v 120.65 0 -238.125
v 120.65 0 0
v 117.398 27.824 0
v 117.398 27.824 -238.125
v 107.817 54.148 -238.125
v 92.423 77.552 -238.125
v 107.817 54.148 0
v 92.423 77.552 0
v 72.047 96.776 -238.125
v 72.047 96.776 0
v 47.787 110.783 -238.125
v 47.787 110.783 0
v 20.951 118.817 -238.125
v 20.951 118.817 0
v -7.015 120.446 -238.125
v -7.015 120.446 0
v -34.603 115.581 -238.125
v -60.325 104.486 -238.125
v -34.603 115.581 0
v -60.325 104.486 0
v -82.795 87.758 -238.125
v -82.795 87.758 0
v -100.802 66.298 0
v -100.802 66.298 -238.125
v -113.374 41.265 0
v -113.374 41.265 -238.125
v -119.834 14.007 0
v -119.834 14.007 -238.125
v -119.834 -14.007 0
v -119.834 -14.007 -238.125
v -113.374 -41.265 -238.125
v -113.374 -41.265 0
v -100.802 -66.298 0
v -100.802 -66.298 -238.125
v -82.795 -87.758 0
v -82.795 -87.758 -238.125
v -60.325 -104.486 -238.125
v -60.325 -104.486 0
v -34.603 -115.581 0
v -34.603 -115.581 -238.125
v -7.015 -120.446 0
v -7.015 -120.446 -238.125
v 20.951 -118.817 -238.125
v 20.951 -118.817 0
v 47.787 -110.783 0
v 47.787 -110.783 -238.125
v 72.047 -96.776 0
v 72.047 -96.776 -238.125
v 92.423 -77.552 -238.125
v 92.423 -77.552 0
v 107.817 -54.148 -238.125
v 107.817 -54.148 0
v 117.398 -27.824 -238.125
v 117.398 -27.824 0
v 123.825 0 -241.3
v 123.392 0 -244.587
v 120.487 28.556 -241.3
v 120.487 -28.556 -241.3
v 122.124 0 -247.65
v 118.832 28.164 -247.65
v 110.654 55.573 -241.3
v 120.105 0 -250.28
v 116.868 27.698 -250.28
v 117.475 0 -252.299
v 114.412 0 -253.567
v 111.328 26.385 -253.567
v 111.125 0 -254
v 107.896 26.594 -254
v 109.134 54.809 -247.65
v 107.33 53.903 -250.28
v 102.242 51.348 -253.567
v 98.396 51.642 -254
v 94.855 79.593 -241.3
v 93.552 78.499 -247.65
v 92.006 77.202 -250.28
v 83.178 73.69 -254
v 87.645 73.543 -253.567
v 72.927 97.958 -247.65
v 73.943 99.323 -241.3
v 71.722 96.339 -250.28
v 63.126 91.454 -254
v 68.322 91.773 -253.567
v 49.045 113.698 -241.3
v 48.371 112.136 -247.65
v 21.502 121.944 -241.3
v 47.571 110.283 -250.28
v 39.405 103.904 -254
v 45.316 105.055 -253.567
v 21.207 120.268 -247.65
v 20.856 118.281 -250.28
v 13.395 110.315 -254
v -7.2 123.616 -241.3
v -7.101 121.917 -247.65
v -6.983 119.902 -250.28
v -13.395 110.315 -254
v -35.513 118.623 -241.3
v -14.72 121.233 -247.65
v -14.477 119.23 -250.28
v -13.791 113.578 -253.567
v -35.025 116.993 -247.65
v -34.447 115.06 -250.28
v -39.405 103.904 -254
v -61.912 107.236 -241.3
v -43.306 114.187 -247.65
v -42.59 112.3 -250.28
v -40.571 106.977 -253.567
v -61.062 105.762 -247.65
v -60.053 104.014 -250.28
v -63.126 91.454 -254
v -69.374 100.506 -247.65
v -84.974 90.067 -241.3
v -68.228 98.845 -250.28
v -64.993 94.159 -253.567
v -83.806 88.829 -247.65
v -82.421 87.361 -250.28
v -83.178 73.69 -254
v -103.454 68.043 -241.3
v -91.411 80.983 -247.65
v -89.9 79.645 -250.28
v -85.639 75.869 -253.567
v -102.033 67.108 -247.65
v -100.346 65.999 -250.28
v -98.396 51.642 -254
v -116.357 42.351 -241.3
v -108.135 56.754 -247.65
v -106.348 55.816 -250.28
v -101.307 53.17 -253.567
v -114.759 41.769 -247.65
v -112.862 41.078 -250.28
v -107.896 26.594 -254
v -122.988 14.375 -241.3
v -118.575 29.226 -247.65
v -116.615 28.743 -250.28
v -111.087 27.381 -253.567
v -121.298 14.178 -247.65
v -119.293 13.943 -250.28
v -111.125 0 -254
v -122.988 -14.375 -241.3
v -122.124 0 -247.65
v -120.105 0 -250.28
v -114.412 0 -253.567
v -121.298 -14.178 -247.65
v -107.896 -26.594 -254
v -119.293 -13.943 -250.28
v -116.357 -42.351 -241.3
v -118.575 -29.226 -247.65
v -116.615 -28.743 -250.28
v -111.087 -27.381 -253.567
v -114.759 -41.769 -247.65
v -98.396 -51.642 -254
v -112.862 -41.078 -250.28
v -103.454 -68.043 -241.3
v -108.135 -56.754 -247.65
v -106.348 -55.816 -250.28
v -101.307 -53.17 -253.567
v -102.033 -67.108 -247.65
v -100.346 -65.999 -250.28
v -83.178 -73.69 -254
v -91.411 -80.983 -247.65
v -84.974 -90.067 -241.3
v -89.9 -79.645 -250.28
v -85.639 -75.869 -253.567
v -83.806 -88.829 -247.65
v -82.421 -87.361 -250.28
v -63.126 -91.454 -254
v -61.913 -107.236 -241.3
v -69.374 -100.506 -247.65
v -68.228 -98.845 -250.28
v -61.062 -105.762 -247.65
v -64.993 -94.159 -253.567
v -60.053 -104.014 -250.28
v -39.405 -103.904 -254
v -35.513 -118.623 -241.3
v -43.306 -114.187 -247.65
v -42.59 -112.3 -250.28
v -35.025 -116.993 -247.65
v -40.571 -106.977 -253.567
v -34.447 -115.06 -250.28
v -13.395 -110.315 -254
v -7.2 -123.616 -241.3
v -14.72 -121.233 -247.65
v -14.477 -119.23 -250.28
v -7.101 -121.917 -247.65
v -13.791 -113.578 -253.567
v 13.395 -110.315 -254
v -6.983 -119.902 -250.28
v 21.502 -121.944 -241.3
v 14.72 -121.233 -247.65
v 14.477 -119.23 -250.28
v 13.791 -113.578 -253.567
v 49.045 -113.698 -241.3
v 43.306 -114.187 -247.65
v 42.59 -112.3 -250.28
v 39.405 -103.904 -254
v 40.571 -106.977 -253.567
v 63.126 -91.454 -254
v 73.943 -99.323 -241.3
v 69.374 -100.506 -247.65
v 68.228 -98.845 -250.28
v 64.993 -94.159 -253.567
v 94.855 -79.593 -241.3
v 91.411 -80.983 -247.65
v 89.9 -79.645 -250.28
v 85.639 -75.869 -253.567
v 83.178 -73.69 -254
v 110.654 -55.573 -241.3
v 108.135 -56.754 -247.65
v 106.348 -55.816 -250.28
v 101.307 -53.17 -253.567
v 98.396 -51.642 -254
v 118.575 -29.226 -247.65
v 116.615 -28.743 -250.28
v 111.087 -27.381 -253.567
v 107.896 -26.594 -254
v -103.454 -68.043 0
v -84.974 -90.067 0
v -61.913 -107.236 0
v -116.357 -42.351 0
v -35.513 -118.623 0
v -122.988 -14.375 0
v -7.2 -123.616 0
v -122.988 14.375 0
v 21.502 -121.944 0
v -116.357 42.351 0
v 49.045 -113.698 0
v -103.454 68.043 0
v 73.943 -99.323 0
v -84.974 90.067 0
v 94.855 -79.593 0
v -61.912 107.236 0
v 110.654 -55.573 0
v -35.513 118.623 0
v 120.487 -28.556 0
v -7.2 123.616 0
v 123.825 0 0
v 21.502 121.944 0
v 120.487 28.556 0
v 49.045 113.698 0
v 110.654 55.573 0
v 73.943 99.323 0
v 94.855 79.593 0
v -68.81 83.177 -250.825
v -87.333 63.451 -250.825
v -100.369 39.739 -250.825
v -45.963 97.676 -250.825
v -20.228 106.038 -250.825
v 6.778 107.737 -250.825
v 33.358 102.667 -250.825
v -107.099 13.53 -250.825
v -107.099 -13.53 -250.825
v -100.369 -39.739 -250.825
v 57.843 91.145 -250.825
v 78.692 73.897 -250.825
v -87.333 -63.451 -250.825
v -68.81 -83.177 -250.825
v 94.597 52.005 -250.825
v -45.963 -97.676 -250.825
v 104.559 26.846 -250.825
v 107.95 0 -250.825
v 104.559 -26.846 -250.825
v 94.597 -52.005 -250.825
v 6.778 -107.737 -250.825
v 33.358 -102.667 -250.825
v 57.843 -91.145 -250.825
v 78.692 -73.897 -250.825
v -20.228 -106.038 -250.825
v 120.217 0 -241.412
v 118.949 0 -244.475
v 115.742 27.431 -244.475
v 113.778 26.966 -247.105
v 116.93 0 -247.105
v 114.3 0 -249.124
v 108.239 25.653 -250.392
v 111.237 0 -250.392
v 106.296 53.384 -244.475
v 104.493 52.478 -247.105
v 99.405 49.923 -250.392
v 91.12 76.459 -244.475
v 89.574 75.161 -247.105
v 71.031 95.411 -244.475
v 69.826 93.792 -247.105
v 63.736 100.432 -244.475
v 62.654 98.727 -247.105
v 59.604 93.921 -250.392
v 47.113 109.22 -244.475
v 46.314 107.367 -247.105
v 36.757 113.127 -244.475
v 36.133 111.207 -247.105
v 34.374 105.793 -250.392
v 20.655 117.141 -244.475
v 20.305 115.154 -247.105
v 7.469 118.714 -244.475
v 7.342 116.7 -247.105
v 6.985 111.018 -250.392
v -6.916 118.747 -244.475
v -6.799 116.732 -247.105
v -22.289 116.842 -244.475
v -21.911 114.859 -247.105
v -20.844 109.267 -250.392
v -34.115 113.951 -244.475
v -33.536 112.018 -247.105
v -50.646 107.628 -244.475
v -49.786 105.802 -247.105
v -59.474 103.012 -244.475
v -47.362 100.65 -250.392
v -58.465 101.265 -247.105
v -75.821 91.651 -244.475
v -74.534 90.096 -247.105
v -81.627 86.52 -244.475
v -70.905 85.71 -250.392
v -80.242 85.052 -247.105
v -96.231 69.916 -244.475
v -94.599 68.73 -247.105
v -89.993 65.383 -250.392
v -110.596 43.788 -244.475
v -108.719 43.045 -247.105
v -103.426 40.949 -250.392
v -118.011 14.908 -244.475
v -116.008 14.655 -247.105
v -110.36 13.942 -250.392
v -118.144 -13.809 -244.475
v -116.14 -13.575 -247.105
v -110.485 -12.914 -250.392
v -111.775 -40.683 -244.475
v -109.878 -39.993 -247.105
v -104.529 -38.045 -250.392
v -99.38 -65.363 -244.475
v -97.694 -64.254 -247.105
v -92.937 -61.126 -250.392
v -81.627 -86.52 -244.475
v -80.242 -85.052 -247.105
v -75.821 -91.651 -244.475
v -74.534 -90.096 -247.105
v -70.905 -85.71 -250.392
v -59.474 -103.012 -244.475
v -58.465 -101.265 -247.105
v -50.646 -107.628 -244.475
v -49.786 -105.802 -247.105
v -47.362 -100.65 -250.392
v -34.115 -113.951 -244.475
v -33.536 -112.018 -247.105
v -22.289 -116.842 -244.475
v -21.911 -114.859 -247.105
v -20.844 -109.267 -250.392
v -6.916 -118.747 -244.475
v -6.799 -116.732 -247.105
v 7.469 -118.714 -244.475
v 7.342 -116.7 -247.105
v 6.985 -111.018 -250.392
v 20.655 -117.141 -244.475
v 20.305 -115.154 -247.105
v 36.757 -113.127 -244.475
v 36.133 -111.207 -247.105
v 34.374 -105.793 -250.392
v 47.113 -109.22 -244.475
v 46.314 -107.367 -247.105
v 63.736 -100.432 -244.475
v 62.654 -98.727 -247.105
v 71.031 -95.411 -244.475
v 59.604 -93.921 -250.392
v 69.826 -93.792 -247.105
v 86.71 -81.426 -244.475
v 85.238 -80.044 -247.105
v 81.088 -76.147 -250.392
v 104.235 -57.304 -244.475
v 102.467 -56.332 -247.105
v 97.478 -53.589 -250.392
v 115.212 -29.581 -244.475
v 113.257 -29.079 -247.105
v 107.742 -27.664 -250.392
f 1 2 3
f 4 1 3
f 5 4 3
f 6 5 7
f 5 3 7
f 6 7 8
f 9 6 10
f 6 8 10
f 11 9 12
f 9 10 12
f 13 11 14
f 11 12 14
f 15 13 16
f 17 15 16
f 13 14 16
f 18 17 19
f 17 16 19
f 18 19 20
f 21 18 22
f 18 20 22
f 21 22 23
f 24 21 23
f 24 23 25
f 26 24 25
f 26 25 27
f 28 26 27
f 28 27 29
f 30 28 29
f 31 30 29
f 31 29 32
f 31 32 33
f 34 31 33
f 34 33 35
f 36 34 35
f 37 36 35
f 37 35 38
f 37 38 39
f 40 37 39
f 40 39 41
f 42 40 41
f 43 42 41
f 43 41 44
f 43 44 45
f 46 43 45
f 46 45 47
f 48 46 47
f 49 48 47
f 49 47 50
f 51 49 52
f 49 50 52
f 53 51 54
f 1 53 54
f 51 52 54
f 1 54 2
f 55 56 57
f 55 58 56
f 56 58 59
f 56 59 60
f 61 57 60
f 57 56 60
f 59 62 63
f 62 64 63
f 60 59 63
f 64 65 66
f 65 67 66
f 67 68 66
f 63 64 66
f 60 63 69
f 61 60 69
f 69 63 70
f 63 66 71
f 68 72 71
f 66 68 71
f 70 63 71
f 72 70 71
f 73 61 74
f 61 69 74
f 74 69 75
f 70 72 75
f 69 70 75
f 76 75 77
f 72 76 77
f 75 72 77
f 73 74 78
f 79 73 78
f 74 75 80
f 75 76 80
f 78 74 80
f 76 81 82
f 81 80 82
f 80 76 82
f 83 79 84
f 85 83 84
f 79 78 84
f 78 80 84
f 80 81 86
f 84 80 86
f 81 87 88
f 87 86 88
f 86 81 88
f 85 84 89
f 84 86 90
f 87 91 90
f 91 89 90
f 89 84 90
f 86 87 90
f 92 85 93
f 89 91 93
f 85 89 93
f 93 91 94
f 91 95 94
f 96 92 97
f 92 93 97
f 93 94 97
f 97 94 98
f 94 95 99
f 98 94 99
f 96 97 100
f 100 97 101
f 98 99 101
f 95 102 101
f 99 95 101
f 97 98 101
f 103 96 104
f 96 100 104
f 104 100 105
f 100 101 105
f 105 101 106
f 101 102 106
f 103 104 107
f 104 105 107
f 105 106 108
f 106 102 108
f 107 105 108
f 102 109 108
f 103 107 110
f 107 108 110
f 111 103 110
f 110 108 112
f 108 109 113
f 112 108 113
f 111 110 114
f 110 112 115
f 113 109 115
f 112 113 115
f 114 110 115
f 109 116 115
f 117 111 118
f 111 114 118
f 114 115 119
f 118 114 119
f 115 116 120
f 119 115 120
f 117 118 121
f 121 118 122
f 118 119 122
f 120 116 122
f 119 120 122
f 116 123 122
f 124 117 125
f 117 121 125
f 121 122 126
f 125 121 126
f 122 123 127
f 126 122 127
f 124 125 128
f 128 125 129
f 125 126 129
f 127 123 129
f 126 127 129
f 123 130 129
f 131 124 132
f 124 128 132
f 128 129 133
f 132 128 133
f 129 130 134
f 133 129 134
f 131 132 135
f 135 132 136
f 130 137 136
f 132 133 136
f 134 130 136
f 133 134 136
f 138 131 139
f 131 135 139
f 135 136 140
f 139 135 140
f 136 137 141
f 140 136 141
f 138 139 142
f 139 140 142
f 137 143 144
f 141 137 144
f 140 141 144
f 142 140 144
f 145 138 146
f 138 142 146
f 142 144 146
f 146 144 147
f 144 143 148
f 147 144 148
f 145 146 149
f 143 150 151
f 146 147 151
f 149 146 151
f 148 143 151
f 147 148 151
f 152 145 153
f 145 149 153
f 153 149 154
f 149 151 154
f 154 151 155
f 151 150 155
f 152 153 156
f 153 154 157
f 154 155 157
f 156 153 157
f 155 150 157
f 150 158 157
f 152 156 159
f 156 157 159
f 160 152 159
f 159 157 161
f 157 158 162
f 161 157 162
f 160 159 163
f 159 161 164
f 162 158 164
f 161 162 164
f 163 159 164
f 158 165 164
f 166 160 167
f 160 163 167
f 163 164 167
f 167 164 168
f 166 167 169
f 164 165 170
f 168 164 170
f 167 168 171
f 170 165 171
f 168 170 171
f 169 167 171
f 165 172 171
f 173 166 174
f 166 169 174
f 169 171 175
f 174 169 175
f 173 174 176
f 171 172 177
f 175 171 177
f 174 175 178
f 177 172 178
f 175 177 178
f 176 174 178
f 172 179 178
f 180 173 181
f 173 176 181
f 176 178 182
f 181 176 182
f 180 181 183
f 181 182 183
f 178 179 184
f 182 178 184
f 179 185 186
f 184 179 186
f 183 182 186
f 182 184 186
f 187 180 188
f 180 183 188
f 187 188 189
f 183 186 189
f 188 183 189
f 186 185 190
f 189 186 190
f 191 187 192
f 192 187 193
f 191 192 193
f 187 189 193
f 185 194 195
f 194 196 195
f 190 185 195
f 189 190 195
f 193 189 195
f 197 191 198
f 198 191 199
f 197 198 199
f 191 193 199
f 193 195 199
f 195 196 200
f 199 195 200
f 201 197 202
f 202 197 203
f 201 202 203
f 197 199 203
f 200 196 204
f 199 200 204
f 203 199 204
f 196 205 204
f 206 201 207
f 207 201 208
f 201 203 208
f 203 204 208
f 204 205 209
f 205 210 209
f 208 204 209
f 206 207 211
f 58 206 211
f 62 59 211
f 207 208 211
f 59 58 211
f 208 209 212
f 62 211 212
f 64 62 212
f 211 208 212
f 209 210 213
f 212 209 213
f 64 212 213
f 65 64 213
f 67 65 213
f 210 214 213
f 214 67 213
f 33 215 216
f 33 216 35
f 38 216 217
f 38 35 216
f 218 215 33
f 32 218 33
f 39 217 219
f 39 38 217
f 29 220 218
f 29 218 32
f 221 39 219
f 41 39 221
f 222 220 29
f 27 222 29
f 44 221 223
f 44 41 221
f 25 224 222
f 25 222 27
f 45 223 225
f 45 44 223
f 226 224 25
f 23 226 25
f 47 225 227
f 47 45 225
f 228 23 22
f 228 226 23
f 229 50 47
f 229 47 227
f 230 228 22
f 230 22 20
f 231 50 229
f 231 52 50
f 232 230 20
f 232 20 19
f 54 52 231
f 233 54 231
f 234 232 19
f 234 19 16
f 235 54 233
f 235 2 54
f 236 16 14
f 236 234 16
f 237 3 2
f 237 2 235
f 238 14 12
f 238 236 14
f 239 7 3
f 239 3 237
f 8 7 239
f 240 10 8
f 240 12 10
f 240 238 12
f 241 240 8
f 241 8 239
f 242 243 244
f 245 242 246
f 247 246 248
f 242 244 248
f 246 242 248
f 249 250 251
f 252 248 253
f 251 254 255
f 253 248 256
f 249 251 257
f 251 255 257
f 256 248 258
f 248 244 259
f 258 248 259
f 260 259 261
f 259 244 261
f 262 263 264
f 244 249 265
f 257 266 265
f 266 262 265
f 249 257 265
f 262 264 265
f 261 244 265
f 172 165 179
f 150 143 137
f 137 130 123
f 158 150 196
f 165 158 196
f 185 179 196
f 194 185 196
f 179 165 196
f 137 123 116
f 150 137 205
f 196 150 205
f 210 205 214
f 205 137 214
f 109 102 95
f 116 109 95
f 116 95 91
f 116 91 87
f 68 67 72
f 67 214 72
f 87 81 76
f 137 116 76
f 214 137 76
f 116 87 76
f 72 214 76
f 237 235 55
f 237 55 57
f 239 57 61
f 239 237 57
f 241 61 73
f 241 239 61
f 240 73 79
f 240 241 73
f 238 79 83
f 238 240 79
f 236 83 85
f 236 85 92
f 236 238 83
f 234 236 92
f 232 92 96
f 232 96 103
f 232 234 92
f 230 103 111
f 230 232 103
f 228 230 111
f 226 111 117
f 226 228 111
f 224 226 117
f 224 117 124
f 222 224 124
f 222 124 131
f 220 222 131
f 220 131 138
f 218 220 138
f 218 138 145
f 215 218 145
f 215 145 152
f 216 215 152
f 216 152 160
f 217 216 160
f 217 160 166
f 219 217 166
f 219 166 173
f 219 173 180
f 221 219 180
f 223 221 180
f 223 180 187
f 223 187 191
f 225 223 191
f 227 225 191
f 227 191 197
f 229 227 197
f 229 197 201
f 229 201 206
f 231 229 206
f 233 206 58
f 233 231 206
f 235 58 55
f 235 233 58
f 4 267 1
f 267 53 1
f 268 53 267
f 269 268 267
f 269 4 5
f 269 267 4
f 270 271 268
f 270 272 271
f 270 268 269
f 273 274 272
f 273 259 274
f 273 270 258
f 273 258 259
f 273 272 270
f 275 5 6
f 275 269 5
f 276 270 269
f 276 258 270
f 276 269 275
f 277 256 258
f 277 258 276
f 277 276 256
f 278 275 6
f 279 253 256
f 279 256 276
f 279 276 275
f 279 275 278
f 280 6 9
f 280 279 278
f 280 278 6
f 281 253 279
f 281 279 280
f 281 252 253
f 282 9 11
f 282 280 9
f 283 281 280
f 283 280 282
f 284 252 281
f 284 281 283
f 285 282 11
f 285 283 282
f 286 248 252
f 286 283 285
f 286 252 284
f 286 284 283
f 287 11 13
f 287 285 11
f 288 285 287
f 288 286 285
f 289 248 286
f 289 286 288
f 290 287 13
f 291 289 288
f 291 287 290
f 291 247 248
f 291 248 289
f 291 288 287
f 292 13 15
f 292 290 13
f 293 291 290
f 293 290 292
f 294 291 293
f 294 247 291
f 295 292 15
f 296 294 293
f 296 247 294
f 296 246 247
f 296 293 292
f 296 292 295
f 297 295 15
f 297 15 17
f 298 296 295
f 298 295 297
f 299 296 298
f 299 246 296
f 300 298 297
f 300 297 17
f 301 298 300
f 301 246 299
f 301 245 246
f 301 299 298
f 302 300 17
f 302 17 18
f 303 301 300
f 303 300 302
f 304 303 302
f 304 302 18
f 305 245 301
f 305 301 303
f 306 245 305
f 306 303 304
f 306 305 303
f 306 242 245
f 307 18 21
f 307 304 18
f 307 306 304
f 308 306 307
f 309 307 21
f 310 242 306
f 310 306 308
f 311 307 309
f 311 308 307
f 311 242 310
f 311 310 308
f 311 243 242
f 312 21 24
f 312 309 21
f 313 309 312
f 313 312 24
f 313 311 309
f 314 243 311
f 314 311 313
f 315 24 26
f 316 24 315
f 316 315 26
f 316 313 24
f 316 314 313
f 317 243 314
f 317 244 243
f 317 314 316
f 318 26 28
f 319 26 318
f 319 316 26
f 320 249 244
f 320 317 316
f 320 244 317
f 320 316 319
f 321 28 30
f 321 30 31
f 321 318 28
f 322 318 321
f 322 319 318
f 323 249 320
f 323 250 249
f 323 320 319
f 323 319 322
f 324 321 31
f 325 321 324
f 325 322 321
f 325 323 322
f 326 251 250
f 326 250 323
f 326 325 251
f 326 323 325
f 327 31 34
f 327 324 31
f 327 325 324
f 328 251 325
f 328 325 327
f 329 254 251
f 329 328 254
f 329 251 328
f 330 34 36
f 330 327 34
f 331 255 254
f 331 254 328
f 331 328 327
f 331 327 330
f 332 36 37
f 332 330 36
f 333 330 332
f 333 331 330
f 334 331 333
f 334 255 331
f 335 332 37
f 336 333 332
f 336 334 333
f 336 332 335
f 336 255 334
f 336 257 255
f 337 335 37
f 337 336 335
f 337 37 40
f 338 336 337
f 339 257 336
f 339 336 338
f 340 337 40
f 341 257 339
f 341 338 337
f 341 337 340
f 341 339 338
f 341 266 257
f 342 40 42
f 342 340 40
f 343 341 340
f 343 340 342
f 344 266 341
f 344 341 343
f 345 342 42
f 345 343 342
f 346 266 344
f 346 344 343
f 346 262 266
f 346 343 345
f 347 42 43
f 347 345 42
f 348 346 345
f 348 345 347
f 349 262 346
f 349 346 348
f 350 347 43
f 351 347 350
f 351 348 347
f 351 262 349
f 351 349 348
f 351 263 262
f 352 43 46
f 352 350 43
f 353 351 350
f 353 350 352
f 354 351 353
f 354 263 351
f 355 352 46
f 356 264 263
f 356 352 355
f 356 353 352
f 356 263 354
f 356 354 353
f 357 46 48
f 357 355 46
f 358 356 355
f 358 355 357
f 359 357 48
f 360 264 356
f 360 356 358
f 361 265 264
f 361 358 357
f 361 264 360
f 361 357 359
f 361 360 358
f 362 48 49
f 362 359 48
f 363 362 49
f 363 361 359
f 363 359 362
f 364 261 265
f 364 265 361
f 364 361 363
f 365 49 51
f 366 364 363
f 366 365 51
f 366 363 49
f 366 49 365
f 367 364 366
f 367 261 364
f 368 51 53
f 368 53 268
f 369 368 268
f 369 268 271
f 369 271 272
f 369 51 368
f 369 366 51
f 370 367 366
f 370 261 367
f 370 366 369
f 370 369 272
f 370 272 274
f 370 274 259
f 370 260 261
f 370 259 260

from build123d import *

# Parameters (mm, degrees)
F0_R     = 123.825
F0_R_2   = 120.65
F1_DEPTH = 254
F2_R     = 123.825
F3_DEPTH = 3.175
F4_R     = 12.7


with BuildPart() as f1:
    # F0 (on Top) → F1 (new body)
    with BuildSketch(Plane.XY):
        Circle(F0_R)
        Circle(F0_R_2, mode=Mode.SUBTRACT)
    extrude(amount=-F1_DEPTH)

    # F2 (on face) → F3 (join)
    with BuildSketch(Plane(origin=(0, 0, -254), x_dir=(1, 0, 0), z_dir=(0, 0, -1))):
        Circle(F2_R)
    extrude(amount=-F3_DEPTH)

    # F4
    f4_edges = [f1.edges().sort_by_distance(p)[0] for p in [
        (-123.825, 0, -254),
        (-120.65, 0, -250.825),
    ]]
    fillet(f4_edges, radius=F4_R)


solid = f1.part
